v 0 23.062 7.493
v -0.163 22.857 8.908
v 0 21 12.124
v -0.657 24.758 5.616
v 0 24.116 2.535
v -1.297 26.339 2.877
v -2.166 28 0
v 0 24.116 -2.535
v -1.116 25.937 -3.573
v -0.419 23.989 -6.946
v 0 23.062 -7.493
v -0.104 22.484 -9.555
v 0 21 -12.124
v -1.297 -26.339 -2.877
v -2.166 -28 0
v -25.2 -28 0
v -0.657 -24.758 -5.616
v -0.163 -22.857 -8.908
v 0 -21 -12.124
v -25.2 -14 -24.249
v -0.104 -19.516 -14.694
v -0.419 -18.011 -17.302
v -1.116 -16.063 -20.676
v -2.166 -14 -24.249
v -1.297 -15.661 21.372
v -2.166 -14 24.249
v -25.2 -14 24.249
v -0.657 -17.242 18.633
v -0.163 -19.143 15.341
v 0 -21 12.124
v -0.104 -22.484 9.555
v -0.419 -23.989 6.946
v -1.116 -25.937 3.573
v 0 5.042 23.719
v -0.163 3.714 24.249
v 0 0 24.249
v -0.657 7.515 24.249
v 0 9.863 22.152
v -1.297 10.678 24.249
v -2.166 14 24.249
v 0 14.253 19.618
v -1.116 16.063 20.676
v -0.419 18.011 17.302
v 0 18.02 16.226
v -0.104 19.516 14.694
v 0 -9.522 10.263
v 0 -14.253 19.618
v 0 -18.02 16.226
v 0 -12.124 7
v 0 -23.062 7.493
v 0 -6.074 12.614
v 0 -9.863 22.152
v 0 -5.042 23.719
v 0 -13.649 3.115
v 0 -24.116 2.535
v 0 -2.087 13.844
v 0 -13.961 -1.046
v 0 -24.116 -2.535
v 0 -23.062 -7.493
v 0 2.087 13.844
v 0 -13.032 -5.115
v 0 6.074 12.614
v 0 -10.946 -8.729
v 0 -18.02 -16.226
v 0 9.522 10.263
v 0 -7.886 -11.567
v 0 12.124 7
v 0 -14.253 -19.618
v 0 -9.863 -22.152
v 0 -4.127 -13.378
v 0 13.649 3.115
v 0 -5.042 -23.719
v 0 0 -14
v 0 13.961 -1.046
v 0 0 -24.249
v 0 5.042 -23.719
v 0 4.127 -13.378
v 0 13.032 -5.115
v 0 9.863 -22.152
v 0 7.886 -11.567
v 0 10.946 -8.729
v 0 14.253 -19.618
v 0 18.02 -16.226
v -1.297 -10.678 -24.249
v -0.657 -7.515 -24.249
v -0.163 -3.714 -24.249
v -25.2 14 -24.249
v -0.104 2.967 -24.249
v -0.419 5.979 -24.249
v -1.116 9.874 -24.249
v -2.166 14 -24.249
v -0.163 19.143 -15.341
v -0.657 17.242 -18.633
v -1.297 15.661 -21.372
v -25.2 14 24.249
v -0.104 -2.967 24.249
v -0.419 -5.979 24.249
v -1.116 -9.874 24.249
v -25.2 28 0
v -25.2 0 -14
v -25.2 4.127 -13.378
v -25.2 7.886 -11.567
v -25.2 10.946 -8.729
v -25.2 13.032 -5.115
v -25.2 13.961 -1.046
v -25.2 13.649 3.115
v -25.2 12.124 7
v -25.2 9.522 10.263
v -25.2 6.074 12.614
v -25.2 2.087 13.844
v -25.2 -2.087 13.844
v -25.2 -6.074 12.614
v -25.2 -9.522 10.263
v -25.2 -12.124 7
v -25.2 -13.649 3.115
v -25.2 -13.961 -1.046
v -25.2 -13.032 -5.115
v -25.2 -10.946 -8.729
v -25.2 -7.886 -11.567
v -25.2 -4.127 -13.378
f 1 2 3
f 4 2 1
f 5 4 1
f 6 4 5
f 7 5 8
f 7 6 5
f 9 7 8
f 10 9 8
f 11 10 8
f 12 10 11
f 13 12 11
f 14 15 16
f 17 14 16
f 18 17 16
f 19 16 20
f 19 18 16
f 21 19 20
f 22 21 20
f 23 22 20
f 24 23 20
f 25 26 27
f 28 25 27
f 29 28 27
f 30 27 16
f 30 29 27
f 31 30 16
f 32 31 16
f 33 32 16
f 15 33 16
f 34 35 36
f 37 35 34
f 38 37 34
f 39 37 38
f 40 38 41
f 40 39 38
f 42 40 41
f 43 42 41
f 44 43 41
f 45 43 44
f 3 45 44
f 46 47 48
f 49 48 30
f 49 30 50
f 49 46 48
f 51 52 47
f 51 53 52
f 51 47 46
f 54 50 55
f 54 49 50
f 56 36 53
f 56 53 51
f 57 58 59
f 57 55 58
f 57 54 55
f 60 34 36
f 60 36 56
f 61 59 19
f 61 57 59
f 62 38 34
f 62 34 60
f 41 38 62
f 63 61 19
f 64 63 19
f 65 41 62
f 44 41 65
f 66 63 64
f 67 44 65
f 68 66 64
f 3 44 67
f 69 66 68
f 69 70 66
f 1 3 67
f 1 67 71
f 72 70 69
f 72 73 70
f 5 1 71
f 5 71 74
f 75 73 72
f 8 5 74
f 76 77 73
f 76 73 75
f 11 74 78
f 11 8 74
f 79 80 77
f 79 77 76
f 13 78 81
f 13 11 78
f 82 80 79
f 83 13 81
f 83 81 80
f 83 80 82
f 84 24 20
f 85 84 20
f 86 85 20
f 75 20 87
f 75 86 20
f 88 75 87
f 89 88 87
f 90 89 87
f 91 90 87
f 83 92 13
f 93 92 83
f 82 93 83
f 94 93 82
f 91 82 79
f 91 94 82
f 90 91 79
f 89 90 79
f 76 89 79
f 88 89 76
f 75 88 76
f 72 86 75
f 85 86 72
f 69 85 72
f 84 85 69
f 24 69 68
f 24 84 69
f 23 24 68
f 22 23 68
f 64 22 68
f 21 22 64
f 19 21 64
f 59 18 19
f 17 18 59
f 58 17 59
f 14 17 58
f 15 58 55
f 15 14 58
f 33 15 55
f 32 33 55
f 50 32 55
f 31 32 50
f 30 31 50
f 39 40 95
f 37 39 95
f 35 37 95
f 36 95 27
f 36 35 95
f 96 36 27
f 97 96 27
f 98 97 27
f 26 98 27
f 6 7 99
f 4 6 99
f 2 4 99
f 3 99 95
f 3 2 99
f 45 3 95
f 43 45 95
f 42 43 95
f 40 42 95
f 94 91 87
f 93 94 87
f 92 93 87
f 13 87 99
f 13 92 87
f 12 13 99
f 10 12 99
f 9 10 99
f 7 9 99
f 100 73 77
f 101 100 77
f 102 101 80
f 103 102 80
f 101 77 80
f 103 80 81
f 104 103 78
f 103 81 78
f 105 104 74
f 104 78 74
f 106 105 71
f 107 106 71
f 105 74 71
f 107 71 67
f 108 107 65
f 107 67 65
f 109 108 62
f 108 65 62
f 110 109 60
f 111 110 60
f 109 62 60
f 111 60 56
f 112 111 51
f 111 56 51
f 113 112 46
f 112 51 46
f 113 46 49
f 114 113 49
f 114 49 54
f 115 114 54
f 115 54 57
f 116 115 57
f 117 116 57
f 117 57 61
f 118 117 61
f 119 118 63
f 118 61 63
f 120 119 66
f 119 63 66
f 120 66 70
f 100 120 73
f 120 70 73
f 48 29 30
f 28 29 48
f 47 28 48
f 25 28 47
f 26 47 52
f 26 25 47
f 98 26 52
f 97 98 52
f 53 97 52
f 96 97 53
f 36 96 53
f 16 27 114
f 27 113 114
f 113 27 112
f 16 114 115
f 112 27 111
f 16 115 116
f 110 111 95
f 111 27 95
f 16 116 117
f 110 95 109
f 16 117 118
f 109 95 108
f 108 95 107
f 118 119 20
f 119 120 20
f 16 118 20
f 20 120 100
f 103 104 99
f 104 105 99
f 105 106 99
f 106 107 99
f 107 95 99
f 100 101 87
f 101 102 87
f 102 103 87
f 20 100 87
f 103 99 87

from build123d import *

# Parameters (mm, degrees)
BOSS_EXTRUDE1_DEPTH = 25.2
SKETCH2_R           = 14
CUT_EXTRUDE1_DEPTH  = 25.2
SKETCH3_OUTSIDE_W   = 153.444
SKETCH3_OUTSIDE_H   = 160.946
SKETCH3_OUTSIDE_R   = 24.248711306
CUT_EXTRUDE2_DEPTH  = 25.2
CUT_EXTRUDE2_TAPER  = 60


with BuildPart() as part:
    # Sketch1 → Boss-Extrude1 (new body)
    with BuildSketch(Plane(origin=(0, 0, 0), x_dir=(0, 0, -1), z_dir=(1, 0, 0))):
        Polygon((0, 28), (-24.248711306, 14), (-24.248711306, -14), (0, -28), (24.248711306, -14), (24.248711306, 14), align=None)
    extrude(amount=-BOSS_EXTRUDE1_DEPTH)

    # Sketch2 → Cut-Extrude1 (cut)
    with BuildSketch(Plane(origin=(0, 0, 0), x_dir=(0, 0, -1), z_dir=(1, 0, 0))):
        Circle(SKETCH2_R)
    extrude(amount=-CUT_EXTRUDE1_DEPTH, mode=Mode.SUBTRACT)

    # Sketch3 outside → Cut-Extrude2 (cut)
    with BuildSketch(Plane(origin=(0, 0, 0), x_dir=(0, 0, -1), z_dir=(1, 0, 0))):
        Rectangle(SKETCH3_OUTSIDE_W, SKETCH3_OUTSIDE_H)
        Circle(SKETCH3_OUTSIDE_R, mode=Mode.SUBTRACT)
    extrude(amount=-CUT_EXTRUDE2_DEPTH, taper=CUT_EXTRUDE2_TAPER, mode=Mode.SUBTRACT)


solid = part.part
